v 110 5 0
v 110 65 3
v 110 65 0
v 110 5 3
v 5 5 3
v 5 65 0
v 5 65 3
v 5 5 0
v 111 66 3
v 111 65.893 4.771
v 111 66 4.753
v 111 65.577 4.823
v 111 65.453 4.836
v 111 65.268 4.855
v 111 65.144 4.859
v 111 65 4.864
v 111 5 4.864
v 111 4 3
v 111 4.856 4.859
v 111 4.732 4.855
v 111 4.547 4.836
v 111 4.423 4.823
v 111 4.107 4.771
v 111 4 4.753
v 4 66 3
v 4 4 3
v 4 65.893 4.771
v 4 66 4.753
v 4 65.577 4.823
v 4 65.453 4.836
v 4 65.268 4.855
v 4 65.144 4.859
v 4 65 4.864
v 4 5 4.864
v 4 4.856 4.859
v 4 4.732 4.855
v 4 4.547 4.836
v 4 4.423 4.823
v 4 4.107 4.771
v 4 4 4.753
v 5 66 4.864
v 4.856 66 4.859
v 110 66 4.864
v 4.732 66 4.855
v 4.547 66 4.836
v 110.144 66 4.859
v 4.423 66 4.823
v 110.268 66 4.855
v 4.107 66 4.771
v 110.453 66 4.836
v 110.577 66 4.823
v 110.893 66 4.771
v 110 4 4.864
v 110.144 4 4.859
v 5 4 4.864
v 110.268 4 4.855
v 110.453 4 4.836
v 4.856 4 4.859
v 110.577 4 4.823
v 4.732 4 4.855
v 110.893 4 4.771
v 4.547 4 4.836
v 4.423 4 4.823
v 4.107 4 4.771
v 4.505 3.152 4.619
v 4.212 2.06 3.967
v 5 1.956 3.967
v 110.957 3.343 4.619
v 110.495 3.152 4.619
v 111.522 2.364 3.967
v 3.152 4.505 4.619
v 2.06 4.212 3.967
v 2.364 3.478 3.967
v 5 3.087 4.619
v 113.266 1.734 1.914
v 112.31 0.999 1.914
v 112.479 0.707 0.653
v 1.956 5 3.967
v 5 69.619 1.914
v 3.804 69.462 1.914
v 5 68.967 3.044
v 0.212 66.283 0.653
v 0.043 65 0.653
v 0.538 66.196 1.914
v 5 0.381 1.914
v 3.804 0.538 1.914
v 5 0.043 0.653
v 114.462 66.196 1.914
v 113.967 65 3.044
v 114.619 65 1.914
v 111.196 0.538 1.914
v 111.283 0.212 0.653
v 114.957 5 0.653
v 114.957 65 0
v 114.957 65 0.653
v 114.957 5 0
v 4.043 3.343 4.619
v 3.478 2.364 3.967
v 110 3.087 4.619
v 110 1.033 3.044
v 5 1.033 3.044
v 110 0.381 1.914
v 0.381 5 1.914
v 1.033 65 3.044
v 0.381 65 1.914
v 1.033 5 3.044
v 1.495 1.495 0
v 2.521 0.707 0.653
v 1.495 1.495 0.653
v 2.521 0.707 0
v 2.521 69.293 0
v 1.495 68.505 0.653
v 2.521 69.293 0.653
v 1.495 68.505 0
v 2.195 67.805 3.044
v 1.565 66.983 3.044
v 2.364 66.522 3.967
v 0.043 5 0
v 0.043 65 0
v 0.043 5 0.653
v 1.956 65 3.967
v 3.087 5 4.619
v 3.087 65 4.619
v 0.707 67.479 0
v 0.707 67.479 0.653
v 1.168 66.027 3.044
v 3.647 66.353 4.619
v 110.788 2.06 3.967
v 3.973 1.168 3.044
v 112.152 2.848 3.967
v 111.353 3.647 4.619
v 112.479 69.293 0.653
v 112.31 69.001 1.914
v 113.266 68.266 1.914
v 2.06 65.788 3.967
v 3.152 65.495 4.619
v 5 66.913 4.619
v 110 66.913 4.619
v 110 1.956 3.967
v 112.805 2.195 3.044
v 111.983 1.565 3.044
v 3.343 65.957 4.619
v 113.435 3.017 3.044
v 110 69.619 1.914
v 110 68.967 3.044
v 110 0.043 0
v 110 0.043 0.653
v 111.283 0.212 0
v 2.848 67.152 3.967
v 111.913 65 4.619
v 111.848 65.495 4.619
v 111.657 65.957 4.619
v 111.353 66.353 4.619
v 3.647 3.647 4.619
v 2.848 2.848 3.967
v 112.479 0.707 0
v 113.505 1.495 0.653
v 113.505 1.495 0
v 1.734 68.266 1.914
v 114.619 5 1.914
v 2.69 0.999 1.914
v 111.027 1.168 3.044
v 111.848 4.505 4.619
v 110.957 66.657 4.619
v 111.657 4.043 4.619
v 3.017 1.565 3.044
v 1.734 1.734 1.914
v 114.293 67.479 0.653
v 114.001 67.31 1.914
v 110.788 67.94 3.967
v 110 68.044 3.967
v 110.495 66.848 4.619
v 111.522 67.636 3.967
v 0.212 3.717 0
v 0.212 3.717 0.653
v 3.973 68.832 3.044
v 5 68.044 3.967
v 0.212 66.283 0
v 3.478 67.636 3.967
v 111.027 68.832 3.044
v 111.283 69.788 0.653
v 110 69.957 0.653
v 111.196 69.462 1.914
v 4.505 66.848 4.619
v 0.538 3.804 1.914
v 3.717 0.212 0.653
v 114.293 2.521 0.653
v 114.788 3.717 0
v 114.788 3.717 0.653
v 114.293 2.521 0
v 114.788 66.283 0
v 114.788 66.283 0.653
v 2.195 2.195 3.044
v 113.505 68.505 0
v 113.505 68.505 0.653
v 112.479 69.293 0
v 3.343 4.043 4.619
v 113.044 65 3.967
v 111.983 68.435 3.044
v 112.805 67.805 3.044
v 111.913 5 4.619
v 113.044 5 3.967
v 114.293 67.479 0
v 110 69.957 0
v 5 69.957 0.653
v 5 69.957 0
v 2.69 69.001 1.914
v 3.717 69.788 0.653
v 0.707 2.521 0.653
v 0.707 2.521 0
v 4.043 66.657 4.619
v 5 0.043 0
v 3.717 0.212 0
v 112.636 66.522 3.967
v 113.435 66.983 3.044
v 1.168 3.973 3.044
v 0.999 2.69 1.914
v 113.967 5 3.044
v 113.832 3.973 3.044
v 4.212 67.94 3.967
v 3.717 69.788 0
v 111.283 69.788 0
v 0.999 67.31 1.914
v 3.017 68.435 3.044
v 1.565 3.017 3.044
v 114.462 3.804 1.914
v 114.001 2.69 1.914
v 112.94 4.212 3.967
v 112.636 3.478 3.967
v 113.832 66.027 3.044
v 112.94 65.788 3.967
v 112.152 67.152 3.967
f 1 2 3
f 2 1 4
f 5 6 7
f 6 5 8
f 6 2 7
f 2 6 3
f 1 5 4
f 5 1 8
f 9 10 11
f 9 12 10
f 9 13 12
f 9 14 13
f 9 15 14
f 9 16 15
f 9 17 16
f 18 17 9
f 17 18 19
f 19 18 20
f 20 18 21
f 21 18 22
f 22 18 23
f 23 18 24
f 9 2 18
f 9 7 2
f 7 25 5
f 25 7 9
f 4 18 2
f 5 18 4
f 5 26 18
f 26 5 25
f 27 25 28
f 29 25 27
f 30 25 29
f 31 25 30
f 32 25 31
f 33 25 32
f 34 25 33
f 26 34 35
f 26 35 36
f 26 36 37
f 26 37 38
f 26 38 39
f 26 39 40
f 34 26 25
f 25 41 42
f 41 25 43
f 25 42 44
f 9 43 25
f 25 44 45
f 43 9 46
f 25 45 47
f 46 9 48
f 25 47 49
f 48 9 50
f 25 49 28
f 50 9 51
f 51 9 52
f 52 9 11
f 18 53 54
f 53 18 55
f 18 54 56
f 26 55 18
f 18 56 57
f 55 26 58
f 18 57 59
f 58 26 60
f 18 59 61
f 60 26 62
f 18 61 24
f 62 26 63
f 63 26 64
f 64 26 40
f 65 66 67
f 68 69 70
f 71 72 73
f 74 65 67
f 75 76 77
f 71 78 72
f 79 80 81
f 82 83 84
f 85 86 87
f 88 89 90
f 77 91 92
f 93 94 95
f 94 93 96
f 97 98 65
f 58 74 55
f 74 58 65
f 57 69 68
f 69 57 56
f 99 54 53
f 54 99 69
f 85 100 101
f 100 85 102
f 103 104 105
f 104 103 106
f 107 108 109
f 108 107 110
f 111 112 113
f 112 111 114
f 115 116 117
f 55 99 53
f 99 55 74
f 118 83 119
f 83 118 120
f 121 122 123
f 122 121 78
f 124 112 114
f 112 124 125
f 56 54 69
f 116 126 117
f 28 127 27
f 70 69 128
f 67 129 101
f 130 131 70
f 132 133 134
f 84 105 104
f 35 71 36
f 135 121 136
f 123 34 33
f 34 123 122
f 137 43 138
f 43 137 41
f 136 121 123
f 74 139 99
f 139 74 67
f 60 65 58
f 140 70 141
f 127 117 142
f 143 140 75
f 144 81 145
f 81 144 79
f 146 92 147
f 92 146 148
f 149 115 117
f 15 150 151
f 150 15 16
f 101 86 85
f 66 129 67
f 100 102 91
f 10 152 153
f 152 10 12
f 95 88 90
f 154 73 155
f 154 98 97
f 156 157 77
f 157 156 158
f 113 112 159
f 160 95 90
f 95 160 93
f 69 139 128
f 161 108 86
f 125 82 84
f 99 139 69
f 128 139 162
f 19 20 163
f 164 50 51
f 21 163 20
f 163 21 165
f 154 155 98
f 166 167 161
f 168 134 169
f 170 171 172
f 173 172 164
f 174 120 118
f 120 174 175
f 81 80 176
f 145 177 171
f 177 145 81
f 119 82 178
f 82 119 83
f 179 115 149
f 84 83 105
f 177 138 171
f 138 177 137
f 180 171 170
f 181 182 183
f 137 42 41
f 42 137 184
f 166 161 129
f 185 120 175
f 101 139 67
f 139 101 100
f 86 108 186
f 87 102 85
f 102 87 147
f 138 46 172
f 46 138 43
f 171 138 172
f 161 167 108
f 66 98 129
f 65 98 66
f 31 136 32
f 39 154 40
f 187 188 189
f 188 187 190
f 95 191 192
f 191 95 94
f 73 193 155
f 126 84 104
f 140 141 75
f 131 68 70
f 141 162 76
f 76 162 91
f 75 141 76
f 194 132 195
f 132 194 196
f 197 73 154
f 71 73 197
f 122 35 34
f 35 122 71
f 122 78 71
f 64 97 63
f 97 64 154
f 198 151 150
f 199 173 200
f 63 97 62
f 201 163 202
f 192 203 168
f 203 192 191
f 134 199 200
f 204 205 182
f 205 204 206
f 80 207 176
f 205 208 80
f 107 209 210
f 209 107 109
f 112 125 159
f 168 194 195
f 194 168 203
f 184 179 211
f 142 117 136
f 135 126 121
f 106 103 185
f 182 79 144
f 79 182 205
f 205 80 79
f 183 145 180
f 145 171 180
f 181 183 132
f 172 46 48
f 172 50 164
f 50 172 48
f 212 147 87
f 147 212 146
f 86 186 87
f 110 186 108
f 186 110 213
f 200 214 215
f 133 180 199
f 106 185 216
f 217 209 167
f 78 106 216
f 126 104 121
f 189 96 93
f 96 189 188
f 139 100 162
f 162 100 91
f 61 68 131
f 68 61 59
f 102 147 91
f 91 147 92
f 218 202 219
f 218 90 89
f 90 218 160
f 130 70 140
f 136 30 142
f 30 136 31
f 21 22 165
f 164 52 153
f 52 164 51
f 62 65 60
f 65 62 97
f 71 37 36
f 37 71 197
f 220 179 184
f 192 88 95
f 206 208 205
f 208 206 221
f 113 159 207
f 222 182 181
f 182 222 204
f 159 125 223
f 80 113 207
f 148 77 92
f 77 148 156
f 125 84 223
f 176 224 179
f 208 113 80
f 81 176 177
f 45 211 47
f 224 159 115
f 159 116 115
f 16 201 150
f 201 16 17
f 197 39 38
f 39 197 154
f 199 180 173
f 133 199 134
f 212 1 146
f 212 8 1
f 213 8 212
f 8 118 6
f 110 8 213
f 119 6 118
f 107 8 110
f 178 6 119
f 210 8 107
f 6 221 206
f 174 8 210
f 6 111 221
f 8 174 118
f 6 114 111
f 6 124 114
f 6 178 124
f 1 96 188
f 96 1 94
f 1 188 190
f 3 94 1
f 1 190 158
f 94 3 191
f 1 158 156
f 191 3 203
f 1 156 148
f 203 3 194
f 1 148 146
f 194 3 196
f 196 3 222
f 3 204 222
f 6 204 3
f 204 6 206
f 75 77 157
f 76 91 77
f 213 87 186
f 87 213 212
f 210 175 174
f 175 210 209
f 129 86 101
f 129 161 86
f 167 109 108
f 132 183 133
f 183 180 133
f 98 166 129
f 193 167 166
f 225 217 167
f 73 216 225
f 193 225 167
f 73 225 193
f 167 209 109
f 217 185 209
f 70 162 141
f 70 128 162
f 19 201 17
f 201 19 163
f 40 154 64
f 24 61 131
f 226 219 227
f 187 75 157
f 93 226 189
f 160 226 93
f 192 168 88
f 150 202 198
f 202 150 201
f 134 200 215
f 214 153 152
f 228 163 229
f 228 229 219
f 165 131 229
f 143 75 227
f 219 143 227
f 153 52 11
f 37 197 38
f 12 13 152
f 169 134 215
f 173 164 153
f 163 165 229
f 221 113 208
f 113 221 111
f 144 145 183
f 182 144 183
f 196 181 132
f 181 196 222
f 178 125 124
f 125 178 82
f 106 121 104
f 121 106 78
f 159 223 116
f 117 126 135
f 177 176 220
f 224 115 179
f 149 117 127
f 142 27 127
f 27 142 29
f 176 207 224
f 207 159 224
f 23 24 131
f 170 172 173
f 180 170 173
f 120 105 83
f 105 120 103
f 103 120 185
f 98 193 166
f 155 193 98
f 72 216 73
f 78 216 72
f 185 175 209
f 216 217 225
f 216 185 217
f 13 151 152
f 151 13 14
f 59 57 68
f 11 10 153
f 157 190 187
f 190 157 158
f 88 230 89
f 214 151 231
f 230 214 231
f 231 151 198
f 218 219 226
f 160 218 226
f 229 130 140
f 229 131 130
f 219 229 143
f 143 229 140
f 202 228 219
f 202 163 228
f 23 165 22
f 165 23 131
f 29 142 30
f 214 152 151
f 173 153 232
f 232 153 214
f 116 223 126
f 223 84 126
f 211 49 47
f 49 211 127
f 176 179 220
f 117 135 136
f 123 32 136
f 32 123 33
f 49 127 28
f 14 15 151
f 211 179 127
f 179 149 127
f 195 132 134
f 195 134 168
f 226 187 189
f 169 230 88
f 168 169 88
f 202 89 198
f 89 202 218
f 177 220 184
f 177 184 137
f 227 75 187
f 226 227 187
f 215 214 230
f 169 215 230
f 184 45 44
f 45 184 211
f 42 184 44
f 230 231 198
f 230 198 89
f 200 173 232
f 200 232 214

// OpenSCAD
union() {
	difference() {
		translate(v = [5, 5, 0]) {
			minkowski() {
				cube(size = [105, 60, 0.0001000000]);
				difference() {
					sphere($fn = 24, r = 5);
					translate(v = [-5, -5, -5]) {
						cube(size = [10, 10, 5]);
					}
				}
			}
		}
		union() {
			translate(v = [5, 5, -1]) {
				cube(size = [105, 60, 10]);
			}
			translate(v = [4, 4, 3]) {
				cube(size = [107, 62, 10]);
			}
		}
	}
}
